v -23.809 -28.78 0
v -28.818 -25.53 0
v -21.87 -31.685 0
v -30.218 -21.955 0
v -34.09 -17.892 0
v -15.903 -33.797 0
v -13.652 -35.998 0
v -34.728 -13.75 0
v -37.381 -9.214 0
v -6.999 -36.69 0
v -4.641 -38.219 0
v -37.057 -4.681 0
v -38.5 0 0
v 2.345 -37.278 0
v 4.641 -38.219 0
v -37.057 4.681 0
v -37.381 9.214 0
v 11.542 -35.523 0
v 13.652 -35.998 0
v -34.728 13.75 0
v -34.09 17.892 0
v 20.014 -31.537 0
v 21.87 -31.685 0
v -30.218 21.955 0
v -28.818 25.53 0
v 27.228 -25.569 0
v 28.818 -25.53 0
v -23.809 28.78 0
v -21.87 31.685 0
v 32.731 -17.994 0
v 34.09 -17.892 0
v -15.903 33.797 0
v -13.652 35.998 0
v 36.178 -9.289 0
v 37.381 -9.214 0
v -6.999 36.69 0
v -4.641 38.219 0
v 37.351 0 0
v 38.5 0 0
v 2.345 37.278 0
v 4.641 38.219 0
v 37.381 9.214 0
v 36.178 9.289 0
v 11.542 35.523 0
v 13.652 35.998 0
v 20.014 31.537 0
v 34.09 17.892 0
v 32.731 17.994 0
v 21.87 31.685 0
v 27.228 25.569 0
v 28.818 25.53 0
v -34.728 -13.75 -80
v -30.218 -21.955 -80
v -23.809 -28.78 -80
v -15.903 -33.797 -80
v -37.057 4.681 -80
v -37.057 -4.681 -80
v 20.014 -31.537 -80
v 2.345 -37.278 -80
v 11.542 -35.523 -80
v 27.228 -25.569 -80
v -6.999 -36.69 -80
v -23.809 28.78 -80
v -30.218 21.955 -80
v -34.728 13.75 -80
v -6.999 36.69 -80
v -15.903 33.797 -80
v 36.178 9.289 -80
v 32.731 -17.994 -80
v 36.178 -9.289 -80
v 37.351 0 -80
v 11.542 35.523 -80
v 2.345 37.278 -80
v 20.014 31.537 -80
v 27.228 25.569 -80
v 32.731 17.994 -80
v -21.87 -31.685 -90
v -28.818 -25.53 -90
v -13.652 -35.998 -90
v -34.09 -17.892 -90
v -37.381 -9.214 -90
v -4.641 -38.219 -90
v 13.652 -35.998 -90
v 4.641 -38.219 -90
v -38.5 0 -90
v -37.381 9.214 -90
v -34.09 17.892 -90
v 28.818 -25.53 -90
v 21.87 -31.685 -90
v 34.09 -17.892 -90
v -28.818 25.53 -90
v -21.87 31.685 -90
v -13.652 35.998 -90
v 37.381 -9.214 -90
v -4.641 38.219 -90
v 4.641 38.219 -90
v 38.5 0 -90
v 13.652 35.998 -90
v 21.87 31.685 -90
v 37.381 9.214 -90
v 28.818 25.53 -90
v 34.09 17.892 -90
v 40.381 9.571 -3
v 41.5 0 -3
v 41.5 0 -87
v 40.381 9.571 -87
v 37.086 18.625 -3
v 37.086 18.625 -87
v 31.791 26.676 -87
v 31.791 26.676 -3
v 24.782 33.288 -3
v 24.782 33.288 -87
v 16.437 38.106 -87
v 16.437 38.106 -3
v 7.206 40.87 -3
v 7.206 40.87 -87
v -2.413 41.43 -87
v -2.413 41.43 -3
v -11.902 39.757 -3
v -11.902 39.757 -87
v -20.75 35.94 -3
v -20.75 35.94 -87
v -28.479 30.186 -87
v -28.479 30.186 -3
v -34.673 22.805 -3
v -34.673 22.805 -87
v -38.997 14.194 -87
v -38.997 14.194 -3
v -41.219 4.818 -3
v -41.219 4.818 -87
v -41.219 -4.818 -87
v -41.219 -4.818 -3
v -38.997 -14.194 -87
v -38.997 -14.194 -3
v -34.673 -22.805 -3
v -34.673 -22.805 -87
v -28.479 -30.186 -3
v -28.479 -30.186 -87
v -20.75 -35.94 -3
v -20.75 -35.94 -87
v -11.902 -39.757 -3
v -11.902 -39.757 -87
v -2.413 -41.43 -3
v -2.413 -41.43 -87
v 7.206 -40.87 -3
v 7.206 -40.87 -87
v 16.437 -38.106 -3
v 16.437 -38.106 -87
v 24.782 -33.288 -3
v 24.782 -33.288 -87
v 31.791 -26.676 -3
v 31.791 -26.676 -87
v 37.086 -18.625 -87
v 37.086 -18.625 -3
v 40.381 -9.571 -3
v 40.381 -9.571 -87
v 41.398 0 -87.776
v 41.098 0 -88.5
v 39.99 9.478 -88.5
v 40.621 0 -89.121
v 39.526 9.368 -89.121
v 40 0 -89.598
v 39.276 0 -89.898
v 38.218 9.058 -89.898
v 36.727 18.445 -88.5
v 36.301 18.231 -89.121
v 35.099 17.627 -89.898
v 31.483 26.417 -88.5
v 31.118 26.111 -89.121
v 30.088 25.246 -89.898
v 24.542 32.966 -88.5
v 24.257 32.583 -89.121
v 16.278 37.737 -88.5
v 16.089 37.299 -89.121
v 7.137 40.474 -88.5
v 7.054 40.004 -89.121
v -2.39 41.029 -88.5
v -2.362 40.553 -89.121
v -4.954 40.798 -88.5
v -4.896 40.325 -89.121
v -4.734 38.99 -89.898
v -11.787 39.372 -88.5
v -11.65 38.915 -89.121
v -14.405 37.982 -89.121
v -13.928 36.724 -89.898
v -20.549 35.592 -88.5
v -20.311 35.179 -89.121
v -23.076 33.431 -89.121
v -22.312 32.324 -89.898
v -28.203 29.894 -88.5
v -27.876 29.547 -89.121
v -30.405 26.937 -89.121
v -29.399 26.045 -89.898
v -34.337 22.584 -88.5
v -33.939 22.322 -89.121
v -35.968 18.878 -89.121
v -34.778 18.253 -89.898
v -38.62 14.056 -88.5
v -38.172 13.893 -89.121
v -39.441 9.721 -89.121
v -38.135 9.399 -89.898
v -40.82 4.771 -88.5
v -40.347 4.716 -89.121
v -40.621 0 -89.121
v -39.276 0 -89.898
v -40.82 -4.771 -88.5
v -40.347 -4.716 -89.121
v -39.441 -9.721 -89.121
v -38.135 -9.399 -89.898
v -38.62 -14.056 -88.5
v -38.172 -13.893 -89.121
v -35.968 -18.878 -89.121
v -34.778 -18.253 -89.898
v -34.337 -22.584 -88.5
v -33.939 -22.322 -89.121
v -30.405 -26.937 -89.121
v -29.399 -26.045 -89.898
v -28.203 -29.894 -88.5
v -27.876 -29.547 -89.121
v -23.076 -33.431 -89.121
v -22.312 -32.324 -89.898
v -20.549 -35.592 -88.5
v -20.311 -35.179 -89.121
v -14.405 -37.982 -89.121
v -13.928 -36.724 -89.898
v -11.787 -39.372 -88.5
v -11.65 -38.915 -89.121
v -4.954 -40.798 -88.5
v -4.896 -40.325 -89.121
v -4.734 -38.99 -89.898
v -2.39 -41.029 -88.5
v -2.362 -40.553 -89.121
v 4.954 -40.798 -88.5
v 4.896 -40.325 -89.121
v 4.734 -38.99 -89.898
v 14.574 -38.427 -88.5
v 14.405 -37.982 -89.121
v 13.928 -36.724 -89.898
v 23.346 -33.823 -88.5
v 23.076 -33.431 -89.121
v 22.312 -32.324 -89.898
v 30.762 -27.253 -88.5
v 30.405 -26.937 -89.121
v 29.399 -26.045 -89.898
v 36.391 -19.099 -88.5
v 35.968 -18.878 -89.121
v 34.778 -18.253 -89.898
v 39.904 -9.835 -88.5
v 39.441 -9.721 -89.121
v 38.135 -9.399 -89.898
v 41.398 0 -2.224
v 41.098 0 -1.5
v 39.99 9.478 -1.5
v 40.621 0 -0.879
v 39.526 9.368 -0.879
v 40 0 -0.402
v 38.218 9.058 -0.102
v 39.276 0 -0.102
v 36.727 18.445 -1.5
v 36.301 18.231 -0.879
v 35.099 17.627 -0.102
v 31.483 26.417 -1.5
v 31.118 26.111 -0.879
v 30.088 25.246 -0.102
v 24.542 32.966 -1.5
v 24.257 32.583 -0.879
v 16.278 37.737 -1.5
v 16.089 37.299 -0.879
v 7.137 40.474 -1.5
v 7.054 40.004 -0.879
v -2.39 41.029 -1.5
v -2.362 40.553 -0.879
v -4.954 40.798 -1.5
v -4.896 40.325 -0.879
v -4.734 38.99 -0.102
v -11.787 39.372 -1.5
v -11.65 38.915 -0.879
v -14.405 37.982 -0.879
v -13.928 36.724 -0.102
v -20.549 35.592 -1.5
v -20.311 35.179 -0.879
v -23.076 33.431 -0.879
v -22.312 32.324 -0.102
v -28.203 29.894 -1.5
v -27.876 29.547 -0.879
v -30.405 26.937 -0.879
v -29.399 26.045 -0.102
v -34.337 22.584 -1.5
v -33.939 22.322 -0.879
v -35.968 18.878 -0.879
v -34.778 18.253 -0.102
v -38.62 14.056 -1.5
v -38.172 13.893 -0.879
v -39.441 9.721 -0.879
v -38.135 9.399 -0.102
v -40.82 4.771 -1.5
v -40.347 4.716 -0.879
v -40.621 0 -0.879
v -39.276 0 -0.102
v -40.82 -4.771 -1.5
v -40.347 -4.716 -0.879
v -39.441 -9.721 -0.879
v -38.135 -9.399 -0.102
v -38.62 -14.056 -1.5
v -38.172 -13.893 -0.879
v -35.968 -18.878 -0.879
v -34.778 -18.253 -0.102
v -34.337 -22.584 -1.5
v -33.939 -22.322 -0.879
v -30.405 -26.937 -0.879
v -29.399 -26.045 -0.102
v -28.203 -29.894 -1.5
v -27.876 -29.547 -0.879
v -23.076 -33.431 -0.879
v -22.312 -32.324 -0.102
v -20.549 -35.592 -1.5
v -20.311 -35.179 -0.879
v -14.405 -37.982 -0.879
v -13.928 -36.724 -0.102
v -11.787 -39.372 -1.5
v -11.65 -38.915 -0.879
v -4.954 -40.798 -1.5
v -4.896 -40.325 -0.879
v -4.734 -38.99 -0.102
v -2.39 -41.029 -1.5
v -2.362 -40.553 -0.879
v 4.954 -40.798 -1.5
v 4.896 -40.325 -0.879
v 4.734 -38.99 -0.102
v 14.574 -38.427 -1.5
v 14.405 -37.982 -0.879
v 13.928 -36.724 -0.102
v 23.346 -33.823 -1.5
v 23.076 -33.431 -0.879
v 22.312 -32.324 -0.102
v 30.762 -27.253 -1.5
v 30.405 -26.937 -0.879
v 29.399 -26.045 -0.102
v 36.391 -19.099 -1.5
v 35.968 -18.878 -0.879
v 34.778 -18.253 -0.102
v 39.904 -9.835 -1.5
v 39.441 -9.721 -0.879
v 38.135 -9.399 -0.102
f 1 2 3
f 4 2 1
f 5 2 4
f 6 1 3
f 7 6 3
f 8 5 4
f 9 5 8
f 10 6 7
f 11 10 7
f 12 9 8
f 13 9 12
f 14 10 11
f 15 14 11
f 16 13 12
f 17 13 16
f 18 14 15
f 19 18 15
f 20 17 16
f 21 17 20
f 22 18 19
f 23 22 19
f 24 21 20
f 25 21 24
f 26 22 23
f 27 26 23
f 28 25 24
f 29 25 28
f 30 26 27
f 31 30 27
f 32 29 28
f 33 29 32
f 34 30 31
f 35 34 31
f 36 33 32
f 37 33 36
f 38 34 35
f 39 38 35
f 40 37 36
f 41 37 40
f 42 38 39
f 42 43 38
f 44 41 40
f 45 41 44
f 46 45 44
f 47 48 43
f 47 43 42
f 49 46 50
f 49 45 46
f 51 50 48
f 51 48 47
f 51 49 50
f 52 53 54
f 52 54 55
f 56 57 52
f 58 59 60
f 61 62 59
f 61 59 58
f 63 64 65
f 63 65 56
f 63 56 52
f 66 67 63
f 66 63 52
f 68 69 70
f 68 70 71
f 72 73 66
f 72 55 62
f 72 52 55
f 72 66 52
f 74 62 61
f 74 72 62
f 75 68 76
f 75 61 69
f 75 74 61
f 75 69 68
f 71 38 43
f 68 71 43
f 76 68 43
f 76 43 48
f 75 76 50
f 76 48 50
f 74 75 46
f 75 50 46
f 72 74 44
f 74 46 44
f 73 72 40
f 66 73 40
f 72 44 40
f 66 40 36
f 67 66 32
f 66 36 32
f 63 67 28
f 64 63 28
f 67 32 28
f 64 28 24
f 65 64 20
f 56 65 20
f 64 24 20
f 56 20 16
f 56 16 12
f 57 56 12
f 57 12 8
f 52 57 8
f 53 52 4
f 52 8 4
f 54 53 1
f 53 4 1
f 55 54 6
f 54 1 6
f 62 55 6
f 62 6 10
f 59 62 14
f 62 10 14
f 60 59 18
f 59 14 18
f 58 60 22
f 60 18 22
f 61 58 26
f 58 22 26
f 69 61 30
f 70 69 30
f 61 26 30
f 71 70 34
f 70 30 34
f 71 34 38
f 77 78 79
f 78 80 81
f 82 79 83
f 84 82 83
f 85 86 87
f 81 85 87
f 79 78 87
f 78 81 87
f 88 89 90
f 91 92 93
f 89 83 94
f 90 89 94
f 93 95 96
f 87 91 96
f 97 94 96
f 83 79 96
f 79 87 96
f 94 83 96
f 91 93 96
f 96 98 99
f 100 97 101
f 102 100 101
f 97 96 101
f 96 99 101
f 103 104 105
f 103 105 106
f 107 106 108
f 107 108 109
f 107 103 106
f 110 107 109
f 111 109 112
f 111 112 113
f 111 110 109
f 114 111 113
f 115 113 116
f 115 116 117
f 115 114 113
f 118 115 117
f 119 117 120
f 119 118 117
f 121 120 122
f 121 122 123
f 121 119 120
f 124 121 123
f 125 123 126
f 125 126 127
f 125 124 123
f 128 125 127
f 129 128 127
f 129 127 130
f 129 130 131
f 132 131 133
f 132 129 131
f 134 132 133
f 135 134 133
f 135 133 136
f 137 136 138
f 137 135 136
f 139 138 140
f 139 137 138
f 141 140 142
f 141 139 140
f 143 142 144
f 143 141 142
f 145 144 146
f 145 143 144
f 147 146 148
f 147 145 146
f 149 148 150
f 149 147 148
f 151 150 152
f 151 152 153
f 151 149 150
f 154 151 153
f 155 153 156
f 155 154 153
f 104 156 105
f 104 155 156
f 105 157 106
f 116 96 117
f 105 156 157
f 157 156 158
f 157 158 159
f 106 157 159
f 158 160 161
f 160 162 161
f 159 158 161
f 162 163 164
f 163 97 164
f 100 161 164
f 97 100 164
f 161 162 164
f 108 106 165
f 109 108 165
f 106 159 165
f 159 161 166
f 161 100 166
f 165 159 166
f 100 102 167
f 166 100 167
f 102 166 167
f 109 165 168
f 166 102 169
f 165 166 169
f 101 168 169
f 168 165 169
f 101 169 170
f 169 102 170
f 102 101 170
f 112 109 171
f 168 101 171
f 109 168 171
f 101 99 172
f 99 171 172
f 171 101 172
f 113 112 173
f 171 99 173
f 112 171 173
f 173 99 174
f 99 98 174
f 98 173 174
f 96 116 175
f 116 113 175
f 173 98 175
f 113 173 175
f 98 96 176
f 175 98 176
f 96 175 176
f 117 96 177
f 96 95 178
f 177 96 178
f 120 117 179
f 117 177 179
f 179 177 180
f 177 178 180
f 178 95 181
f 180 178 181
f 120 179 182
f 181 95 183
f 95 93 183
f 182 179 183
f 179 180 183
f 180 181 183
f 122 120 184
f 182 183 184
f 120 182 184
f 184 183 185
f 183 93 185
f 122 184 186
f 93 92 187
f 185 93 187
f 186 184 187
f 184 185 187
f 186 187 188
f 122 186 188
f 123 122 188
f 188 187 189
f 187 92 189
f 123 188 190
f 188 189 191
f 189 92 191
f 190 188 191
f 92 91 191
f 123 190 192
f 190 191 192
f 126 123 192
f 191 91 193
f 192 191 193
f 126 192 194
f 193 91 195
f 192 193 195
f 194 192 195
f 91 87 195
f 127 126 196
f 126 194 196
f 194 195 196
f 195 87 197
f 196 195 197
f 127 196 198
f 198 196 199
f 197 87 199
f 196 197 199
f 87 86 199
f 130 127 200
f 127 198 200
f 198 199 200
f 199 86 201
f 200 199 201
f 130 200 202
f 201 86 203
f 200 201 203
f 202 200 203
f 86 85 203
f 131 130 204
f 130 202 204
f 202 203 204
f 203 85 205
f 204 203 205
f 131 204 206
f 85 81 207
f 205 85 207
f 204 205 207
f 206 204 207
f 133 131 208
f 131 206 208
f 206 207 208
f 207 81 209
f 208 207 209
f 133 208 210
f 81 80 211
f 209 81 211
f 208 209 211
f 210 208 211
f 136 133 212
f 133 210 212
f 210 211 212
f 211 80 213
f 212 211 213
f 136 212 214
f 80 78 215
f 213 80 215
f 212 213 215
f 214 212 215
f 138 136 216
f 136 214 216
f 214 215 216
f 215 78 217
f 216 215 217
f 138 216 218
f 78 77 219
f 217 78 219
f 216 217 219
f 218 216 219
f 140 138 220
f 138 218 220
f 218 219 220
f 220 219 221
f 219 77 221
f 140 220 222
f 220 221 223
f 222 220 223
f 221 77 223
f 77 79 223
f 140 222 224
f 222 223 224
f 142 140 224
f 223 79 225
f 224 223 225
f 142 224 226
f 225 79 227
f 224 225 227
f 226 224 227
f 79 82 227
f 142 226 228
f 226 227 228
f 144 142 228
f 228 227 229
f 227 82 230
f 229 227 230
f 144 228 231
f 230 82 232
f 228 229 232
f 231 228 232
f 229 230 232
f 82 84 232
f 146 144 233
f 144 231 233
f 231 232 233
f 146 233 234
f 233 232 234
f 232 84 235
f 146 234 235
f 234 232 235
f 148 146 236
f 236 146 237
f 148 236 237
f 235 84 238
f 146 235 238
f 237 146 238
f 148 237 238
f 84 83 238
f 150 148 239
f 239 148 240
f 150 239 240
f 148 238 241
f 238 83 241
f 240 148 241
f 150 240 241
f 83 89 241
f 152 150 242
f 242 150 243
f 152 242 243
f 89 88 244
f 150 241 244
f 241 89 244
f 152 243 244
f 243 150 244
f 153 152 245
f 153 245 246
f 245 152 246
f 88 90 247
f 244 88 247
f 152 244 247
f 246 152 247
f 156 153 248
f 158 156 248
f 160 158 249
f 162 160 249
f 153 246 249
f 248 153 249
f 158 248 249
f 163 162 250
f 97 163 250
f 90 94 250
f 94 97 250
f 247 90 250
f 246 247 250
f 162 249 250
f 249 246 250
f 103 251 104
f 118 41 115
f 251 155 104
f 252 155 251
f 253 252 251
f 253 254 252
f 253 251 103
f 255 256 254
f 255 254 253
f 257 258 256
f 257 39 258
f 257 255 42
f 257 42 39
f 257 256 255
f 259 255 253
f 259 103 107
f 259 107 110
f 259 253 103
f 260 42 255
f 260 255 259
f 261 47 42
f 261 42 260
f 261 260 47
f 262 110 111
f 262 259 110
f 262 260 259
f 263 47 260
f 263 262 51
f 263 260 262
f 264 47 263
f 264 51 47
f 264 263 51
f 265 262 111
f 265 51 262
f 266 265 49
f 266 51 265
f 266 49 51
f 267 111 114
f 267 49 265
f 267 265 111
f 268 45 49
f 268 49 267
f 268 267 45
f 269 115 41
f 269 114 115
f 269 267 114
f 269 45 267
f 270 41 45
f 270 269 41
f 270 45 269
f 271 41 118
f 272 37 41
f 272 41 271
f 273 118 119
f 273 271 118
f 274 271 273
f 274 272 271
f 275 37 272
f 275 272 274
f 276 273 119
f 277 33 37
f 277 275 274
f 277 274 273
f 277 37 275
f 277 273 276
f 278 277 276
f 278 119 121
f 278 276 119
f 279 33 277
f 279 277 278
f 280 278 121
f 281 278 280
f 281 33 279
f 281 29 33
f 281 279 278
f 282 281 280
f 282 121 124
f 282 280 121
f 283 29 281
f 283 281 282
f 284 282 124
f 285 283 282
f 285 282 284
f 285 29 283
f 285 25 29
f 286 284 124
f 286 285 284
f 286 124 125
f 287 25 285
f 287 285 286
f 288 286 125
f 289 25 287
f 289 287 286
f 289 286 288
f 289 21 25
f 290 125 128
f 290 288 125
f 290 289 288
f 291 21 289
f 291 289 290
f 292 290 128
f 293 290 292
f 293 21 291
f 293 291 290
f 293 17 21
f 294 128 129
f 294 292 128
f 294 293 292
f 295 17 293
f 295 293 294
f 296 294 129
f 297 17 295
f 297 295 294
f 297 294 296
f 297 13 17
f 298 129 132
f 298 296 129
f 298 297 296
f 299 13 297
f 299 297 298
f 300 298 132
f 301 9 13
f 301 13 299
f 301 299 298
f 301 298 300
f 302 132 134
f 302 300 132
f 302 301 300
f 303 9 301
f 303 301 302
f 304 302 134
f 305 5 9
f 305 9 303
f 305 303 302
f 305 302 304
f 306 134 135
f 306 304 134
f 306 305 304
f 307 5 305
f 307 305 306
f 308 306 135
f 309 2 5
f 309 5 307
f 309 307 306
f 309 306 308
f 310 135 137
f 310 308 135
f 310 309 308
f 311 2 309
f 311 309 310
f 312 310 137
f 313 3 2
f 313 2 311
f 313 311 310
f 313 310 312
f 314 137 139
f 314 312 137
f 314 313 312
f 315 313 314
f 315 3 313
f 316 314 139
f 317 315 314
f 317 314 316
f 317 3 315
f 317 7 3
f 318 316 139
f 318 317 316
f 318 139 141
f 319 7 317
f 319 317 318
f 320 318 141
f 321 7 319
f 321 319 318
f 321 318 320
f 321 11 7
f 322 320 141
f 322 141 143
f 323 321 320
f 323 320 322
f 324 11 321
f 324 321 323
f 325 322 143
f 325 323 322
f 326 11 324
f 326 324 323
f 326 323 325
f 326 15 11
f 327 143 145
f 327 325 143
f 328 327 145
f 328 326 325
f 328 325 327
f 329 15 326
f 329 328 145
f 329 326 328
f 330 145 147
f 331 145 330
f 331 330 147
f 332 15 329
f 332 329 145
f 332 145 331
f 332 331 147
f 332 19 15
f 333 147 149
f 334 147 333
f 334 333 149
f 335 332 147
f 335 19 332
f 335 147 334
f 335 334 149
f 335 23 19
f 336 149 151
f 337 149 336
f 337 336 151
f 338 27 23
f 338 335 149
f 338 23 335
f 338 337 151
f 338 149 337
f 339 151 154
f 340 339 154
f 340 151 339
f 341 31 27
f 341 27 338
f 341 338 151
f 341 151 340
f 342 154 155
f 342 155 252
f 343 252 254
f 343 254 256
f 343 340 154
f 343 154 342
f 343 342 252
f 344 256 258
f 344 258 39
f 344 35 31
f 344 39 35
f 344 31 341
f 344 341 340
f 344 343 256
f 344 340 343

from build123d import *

# Parameters (mm, degrees)
F0_R     = 41.5
F1_DEPTH = 90
F2_R     = 37.351414
F3_DEPTH = 80
F4_R     = 3


with BuildPart() as f1:
    # F0 (on Top) → F1 (new body)
    with BuildSketch(Plane.XY):
        Circle(F0_R)
    extrude(amount=-F1_DEPTH)

    # F2 (on face) → F3 (cut)
    with BuildSketch(Plane.XY):
        Circle(F2_R)
    extrude(amount=-F3_DEPTH, mode=Mode.SUBTRACT)

    # F4
    f4_edges = [f1.edges().sort_by_distance(p)[0] for p in [
        (41.5, 0, -45),
        (-41.5, 0, 0),
        (-41.5, 0, -90),
    ]]
    fillet(f4_edges, radius=F4_R)


solid = f1.part
